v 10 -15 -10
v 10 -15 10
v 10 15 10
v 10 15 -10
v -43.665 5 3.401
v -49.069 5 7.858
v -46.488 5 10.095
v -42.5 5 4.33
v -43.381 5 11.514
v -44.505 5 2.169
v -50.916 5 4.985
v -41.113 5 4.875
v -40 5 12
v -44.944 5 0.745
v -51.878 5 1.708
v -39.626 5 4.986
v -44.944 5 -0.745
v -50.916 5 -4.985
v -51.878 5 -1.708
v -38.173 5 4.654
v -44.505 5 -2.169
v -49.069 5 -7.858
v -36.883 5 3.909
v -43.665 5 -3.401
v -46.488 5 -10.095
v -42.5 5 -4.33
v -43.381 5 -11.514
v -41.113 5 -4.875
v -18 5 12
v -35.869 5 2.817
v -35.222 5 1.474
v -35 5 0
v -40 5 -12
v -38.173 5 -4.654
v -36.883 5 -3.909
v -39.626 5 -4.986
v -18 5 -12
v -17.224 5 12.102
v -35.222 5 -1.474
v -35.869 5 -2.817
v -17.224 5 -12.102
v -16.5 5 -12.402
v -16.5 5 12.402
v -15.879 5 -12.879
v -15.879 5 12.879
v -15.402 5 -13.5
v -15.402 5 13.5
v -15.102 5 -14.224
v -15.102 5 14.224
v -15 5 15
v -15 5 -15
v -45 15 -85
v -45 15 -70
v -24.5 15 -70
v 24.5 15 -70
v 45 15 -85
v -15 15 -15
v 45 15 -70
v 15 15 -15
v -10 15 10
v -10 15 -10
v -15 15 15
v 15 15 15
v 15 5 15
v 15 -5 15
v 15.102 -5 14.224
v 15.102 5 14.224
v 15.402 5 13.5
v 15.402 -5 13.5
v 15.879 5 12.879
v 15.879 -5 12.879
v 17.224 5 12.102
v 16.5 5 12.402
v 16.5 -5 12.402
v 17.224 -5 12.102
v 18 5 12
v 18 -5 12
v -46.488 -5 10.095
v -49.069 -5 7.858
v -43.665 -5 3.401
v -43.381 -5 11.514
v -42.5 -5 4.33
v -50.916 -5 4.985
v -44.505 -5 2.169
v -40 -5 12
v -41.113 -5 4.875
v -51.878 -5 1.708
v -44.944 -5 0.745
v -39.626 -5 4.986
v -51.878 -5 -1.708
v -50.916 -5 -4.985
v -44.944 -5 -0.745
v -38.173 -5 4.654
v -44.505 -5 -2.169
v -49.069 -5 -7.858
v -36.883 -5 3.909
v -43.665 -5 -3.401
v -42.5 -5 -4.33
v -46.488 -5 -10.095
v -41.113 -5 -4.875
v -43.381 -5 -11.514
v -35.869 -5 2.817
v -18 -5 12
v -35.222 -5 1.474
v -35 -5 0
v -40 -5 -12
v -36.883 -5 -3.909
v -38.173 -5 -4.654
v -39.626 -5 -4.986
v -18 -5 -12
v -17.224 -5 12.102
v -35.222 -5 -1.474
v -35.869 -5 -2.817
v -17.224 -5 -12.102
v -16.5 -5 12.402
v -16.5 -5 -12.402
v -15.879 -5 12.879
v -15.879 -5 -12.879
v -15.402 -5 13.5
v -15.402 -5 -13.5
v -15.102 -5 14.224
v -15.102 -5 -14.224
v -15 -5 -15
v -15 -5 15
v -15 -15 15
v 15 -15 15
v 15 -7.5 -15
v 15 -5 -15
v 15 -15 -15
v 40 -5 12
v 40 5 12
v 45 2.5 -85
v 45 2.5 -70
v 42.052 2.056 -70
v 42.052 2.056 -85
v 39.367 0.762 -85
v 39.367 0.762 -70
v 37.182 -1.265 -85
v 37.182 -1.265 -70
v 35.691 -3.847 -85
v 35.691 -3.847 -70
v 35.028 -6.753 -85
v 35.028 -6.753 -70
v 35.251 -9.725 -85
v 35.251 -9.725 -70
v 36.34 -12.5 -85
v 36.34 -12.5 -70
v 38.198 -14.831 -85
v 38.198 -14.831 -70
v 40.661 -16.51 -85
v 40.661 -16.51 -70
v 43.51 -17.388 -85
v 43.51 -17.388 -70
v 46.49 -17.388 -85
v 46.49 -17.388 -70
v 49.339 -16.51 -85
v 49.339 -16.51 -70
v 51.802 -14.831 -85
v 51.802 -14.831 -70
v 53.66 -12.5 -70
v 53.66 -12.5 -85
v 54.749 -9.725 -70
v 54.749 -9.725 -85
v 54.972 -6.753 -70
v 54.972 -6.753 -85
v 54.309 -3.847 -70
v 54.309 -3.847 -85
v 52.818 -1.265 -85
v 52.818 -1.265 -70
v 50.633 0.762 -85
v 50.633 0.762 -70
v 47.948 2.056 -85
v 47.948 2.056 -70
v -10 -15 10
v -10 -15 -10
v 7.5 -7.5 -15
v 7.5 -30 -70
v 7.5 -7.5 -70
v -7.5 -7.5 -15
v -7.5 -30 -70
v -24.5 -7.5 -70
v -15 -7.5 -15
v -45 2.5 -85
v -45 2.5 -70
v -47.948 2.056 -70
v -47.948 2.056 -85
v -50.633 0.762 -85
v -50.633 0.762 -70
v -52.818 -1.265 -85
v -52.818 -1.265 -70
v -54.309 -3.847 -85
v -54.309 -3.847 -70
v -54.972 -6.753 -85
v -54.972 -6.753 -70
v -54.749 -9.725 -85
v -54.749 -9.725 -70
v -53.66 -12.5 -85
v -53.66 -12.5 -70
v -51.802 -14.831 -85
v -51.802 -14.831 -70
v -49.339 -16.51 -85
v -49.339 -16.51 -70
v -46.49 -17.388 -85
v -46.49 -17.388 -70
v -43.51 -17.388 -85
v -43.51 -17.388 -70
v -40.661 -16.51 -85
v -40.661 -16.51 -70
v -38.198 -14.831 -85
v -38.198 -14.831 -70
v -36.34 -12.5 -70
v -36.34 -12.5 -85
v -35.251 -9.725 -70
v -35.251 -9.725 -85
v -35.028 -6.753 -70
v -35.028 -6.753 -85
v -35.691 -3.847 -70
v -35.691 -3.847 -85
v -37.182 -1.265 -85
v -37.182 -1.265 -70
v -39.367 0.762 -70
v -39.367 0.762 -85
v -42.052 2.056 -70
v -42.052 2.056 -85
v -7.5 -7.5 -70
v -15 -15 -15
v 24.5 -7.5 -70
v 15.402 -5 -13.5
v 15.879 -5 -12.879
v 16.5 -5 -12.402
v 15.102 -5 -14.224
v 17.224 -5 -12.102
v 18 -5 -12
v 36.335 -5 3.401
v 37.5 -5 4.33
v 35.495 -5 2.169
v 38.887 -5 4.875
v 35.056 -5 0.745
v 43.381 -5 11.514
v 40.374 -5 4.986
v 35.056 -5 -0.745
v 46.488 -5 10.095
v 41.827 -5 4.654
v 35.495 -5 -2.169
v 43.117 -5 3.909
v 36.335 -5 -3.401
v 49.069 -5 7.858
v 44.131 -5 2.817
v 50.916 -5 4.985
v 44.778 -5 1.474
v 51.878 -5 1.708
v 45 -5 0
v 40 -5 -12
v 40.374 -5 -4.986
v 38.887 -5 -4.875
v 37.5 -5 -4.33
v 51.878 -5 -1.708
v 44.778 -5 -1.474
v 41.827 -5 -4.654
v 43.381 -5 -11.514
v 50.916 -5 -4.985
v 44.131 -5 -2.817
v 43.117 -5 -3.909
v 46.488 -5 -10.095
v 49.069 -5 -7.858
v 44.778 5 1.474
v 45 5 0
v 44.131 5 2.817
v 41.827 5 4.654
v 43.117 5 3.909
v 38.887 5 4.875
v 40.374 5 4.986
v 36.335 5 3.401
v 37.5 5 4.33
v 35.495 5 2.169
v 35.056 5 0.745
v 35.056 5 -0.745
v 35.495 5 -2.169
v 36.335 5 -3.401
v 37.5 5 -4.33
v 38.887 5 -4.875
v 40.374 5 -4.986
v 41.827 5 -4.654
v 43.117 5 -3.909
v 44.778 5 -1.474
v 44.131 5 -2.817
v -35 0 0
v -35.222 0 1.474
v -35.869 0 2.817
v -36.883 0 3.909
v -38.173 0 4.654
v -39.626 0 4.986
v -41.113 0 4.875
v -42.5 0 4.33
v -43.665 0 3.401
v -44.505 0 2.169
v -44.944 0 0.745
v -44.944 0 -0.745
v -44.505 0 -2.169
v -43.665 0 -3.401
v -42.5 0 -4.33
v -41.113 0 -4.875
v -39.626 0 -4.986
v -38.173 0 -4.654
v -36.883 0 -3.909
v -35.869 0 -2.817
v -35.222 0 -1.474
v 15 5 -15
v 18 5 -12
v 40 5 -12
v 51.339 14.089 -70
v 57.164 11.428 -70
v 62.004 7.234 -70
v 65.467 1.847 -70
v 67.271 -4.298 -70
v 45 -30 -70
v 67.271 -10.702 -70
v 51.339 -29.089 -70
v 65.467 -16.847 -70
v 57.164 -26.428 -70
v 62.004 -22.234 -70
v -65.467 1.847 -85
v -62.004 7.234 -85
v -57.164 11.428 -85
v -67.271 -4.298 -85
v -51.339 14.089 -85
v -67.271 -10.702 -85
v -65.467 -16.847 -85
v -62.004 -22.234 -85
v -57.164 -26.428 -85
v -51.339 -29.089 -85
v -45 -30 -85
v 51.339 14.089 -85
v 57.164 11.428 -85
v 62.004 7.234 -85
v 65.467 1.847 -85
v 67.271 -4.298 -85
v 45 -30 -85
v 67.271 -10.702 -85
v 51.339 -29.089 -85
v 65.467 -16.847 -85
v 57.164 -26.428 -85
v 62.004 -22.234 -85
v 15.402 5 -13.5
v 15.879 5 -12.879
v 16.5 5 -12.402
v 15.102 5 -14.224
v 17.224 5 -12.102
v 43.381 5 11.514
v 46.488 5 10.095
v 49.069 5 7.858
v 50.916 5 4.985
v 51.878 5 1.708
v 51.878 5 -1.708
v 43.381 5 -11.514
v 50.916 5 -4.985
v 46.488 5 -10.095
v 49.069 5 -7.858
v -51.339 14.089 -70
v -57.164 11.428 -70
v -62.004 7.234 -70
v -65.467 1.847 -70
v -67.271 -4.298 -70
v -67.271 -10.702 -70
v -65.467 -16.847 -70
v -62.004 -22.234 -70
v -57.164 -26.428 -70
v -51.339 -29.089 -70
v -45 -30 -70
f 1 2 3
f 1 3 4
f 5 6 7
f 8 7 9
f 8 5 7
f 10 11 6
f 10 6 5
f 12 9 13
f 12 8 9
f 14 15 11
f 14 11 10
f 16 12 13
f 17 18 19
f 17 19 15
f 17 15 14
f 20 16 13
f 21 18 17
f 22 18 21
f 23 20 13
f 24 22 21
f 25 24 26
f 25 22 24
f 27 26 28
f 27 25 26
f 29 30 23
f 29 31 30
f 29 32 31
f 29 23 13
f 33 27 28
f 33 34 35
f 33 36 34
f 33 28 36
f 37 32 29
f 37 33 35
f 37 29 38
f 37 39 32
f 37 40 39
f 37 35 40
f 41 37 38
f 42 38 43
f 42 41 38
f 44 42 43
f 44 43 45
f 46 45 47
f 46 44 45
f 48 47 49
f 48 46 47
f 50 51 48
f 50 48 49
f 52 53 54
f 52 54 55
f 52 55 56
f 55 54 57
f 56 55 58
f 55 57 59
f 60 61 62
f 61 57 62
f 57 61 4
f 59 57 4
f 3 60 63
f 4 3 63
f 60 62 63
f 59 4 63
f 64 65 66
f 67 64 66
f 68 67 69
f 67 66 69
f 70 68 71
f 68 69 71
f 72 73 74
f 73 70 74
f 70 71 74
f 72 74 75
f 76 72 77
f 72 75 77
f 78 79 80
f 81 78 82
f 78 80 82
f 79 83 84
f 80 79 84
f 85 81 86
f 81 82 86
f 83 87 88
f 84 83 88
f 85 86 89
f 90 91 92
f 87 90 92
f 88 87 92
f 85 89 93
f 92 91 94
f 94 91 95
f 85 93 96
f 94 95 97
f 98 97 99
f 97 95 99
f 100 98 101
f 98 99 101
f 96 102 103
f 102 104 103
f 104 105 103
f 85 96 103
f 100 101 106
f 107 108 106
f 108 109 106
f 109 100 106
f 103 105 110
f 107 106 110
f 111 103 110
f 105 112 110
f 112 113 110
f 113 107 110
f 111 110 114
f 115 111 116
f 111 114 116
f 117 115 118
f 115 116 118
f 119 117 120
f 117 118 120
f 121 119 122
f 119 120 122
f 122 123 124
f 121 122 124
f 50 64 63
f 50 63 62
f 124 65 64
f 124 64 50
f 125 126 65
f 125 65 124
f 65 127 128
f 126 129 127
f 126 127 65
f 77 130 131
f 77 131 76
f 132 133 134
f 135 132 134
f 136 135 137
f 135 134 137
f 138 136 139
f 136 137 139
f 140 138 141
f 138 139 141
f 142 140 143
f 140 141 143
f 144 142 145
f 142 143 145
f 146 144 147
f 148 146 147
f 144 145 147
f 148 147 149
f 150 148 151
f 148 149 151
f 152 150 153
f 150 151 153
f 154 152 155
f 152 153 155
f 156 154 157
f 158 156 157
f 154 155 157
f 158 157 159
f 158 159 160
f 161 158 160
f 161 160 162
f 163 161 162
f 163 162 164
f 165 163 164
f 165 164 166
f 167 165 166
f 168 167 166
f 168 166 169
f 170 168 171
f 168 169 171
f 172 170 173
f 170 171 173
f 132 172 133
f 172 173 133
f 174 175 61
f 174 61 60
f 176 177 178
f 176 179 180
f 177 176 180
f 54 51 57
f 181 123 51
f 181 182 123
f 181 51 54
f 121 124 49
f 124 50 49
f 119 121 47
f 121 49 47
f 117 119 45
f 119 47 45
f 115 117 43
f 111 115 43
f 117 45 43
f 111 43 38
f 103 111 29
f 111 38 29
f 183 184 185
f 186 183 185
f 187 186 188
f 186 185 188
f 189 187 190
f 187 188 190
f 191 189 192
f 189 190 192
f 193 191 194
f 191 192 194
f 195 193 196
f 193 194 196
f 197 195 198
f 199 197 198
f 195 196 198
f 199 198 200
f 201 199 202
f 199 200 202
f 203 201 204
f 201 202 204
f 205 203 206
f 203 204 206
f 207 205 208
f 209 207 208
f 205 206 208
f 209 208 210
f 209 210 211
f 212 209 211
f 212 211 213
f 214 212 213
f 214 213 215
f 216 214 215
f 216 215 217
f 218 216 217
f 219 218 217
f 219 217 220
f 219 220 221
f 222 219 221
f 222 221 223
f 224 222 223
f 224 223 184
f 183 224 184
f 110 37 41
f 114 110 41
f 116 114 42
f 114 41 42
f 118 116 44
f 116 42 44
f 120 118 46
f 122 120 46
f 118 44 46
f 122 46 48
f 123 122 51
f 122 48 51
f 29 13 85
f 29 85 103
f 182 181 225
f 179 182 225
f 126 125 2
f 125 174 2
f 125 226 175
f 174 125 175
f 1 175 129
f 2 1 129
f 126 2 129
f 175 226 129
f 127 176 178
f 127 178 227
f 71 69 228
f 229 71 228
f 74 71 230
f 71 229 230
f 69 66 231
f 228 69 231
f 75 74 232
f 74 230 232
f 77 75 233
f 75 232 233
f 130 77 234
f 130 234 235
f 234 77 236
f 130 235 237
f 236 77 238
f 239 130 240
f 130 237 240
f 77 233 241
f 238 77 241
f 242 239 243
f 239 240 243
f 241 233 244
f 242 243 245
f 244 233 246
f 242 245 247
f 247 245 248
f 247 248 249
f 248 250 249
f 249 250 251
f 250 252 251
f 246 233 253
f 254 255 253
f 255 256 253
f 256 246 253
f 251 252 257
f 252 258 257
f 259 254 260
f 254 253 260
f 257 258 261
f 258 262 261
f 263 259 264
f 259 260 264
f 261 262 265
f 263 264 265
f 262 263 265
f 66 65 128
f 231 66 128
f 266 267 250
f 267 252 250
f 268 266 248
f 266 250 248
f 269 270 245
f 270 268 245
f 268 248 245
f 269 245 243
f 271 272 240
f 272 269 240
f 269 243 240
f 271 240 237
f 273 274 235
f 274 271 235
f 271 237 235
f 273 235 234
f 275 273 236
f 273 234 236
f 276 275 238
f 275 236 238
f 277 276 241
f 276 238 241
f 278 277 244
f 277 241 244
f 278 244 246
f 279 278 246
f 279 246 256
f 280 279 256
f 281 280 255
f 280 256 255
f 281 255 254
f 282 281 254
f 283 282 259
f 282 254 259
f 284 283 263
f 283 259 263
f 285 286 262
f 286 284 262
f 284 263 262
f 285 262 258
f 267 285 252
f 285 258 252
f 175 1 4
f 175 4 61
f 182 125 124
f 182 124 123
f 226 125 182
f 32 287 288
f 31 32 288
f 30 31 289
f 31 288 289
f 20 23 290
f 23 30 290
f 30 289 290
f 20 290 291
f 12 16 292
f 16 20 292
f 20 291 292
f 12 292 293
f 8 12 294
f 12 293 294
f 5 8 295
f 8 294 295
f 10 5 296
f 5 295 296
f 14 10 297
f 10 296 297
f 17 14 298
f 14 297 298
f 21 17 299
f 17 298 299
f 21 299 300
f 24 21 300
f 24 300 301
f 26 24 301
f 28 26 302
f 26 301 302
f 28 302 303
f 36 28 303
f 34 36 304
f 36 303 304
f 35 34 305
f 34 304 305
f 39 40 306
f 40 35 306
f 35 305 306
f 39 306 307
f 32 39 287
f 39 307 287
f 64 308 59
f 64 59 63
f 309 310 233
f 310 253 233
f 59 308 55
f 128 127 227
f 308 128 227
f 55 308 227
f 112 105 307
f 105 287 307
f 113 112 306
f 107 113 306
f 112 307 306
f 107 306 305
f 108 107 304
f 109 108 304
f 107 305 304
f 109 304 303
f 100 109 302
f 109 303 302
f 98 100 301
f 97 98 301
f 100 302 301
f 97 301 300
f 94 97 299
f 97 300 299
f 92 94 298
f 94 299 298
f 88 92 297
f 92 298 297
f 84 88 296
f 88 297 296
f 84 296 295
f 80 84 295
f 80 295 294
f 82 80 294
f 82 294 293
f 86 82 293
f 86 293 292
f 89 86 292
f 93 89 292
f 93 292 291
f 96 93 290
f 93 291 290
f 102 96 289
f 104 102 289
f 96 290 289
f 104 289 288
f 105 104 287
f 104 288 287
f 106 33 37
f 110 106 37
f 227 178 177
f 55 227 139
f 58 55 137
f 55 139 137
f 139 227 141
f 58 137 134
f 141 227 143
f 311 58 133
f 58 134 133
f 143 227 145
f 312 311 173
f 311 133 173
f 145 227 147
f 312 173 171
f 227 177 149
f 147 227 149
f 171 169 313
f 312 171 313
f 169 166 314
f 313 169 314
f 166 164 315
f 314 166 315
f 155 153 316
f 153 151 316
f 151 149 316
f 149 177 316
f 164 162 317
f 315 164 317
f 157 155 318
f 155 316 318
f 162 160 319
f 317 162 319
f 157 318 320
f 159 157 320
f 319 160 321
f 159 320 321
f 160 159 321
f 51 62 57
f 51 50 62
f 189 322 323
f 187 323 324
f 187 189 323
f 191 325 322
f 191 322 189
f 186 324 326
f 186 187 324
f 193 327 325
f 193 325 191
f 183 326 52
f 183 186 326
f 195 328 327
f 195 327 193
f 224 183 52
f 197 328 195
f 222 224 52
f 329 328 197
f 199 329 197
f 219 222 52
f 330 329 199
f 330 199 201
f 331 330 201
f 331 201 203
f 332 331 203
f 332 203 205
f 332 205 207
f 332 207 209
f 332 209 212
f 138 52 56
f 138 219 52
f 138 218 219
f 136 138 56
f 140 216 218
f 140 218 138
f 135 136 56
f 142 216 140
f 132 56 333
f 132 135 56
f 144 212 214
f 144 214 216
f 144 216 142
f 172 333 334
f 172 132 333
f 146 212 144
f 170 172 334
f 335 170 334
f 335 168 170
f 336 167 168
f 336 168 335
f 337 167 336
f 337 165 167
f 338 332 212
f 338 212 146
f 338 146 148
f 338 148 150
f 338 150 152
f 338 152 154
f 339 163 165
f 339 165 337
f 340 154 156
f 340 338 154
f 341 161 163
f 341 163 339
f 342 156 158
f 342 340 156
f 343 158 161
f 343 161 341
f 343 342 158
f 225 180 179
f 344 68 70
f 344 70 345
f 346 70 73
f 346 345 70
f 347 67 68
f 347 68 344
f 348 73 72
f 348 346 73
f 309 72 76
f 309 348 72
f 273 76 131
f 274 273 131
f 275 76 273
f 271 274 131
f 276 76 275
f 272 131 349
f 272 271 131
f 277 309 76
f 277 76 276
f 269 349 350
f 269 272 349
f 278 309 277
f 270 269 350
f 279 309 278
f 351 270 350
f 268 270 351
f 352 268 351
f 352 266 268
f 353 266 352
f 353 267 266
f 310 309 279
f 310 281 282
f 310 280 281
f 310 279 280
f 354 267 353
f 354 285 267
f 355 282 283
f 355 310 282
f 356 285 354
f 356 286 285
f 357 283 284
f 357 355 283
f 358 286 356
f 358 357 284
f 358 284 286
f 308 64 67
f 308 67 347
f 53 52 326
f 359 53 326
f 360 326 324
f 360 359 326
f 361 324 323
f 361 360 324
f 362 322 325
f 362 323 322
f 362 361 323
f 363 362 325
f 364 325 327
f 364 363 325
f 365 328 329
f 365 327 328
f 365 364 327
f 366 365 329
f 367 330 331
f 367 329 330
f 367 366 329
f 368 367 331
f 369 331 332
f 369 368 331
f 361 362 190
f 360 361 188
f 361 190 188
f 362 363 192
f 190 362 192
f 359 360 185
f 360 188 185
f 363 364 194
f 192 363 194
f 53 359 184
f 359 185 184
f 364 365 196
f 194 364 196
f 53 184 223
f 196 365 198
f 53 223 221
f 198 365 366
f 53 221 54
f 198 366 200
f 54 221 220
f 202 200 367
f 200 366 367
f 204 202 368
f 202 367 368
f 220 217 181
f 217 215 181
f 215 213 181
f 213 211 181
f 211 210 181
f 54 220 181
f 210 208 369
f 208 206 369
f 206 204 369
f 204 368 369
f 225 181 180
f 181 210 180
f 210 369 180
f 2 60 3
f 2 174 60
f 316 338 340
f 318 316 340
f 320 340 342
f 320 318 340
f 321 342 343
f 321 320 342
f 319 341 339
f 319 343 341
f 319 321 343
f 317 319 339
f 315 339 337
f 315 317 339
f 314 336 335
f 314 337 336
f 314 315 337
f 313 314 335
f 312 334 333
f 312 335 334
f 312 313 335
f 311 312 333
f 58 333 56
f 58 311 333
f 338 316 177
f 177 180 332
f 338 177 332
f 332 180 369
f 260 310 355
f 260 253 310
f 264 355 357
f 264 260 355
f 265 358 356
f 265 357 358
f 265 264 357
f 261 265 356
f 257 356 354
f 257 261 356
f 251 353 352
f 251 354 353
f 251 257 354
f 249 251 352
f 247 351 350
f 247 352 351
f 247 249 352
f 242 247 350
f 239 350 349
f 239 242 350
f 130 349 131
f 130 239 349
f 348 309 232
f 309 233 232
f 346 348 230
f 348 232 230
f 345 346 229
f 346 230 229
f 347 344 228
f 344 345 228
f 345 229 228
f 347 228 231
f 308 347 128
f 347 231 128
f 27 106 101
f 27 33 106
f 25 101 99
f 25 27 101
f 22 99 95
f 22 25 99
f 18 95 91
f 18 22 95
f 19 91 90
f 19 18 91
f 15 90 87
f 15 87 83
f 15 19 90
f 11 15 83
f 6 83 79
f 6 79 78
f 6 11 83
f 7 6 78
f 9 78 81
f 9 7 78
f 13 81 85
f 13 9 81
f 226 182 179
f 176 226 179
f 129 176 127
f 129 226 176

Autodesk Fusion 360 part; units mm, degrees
sketch "Sketch1" plane through (0, 0, 0) normal (0, 1, 0) x (1, 0, 0)
  line L0 (-10, -10) -> (10, -10)
  line L1 (10, -10) -> (10, 10)
  line L2 (10, 10) -> (-10, 10)
  line L3 (-10, 10) -> (-10, -10)
  line L4 (0, 15) -> (15, 15)
  line L5 (15, -15) -> (-15, -15)
  line L6 (0, 15) -> (-15, 15)
  line L7 (0, -15) -> (15, -15)
  line L8 (0, -15) -> (-15, -15)
  line L9 (-15, 15) -> (15, 15)
  line L10 (-40, -12) -> (-18, -12)
  line L11 (-40, 12) -> (-18, 12)
  line L12 (40, 12) -> (18, 12)
  line L13 (40, -12) -> (18, -12)
  arc A0 (-40, 12) -> (-40, -12) centre (-40, 0) ccw
  line L14 (15, 15) -> (15, 15)
  line L15 (15, -15) -> (15, -15)
  arc A1 (40, -12) -> (40, 12) centre (40, 0) ccw
  line L16 (-15, -15) -> (-15, -15)
  line L17 (-15, 15) -> (-15, 15)
  circle A2 centre (-40, 0) radius 5
  circle A3 centre (40, 0) radius 5
  arc A4 (-18, 12) -> (-15, 15) centre (-18, 15) ccw
  arc A5 (15, 15) -> (18, 12) centre (18, 15) ccw
  arc A6 (18, -12) -> (15, -15) centre (18, -15) ccw
  arc A7 (-15, -15) -> (-18, -12) centre (-18, -15) ccw
  line L18 (-15, -15) -> (-15, 15)
  line L19 (15, 15) -> (15, -15)
  line L20 (52, 0) -> (52, 70) construction
  line L21 (-52, 0) -> (-52, 70) construction
  line L22 (0, 70) -> (-24.5, 70)
  line L23 (0, 70) -> (24.5, 70)
  line L24 (-15, 15) -> (-24.5, 70)
  line L25 (15, 15) -> (24.5, 70)
  dimension "d2" = 15
  dimension "d4" = 30
  dimension "d12" = 3
  dimension "d13" = 3
  dimension "d14" = 3
  dimension "d15" = 3
  dimension "d17" = 70
  dimension "d19" = 70
  dimension "d20" = 24.5
  dimension "d21" = 24.5
extrude "Extrude1" add sketch "Sketch1" along normal blind 15 and the other way blind 15 contours L4 L5 L6 L7 L8 L9 L18 L19
extrude "Extrude3" add sketch "Sketch1" along normal blind 5 contours L10 L11 A0 A4 A7 L18
extrude "Extrude4" add sketch "Sketch1" along normal blind 0 and the other way blind 5 contours L10 L11 A0 A4 A7 L18
extrude "Extrude5" add sketch "Sketch1" along normal blind 5 and the other way blind 5 contours L12 L13 A1 A5 A6 L19
extrude "Extrude6" add sketch "Sketch1" along normal blind 15 and the other way blind 7.5 contours L4 L6 L9 L22 L23 L24 L25
sketch "Sketch2" plane through (0, 0, 0) normal (1, 0, 0) x (0, 1, 0)
  line L0 (0, -15) -> (-7.5, -15)
  line L1 (-7.5, -15) -> (-7.5, -70)
  line L2 (-7.5, -70) -> (-30, -70)
  line L3 (-7.5, -15) -> (-30, -70)
  dimension "d44" = 7.5
  dimension "d45" = 22.5
extrude "Extrude7" add sketch "Sketch2" along normal blind 7.5 and the other way blind 7.5
sketch "Sketch3" plane through (0, 0, -70) normal (0, 0, -1) x (1, 0, 0)
  line L0 (-24.5, 7.5) -> (-24.5, -15)
  line L1 (-24.5, -15) -> (24.5, -15)
  line L2 (24.5, -15) -> (24.5, 7.5)
  line L3 (24.5, 7.5) -> (7.5, 7.5)
  line L4 (7.5, 7.5) -> (7.5, 30)
  line L5 (7.5, 30) -> (-7.5, 30)
  line L6 (-7.5, 30) -> (-7.5, 7.5)
  line L7 (-7.5, 7.5) -> (-24.5, 7.5)
  line L8 (0, -15) -> (45, -15)
  line L9 (45, -15) -> (-45, -15)
  line L10 (-45, 30) -> (45, 30)
  arc A0 (-45, -2.5) -> (-45, 17.5) centre (-45, 7.5) ccw
  arc A1 (-45, 17.5) -> (-45, -2.5) centre (-45, 7.5) ccw
  arc A2 (45, -2.5) -> (45, 17.5) centre (45, 7.5) ccw
  arc A3 (45, 17.5) -> (45, -2.5) centre (45, 7.5) ccw
  arc A4 (45, -15) -> (45, 30) centre (45, 7.5) ccw
  arc A5 (-45, 30) -> (-45, -15) centre (-45, 7.5) ccw
  line L11 (-24.5, -15) -> (24.5, -15)
  dimension "d51" = 22.5
  dimension "d52" = 20
  dimension "d53" = 20
extrude "Extrude8" add sketch "Sketch3" along normal blind 15
extrude "Extrude2" [suppressed]
